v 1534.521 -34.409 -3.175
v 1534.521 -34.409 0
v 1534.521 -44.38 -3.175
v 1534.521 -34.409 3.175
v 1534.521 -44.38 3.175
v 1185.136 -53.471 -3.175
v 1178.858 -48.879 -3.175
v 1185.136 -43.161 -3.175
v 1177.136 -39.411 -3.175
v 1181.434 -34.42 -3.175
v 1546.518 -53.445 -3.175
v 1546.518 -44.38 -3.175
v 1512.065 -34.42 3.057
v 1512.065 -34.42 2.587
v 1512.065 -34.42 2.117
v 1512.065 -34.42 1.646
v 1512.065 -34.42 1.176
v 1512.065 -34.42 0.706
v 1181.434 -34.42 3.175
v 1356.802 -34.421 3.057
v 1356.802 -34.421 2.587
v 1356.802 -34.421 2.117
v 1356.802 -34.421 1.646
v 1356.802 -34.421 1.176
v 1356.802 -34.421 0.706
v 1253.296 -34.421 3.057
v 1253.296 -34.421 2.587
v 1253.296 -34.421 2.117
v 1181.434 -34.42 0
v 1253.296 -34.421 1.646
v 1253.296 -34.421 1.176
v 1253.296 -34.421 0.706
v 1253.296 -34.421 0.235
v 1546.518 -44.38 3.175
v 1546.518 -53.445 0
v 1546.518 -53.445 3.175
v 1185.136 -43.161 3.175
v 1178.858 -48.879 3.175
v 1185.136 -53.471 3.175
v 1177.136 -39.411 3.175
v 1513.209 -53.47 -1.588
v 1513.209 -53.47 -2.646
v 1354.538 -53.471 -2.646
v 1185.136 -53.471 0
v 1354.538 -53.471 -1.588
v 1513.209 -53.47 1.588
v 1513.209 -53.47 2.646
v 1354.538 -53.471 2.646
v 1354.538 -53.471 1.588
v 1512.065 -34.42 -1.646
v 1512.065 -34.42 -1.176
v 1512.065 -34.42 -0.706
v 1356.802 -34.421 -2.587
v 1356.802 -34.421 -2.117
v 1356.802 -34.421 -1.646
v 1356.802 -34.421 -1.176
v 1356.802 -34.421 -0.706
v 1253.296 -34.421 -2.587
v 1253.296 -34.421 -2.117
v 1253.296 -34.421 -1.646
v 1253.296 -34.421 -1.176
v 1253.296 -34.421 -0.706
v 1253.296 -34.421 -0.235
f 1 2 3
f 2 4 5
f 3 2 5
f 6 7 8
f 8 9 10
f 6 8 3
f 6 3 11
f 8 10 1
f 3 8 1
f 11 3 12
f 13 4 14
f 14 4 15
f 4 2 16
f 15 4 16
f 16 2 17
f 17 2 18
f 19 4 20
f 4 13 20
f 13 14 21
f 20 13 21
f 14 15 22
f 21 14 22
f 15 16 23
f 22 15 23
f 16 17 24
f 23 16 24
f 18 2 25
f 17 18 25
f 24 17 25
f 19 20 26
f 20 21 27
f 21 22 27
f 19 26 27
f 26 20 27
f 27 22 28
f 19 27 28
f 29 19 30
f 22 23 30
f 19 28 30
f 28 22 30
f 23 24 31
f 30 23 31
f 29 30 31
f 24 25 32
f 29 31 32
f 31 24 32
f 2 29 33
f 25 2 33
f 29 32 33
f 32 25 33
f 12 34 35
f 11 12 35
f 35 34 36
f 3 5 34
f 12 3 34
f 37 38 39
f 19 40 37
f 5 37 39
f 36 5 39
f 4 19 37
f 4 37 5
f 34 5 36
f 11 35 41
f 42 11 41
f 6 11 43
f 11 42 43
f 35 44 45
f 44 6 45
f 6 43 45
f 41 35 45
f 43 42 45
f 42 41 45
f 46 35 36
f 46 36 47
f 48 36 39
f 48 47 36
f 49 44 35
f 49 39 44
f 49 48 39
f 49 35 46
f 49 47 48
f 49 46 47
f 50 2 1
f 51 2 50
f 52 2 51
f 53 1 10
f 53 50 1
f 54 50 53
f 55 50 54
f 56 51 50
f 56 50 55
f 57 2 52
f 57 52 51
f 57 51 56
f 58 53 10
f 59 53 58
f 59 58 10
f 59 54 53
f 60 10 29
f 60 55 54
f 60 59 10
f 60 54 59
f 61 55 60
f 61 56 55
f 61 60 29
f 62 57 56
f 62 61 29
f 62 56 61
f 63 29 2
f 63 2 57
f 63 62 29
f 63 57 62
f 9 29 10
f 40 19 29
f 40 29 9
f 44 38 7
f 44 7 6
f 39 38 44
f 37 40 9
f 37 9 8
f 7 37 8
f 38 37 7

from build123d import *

# Parameters (mm, degrees)
BOSS_EXTRUDE1_DEPTH = 3.175
CUT_EXTRUDE1_DEPTH  = 7.3500001
FILLET1_R           = 2.54
CUT_EXTRUDE2_DEPTH  = 7.62


with BuildPart() as part:
    # Sketch1 → Boss-Extrude1 (new body, symmetric)
    with BuildSketch(Plane.XY):
        with BuildLine():
            Line((499.61002795, -53.470702797), (1046.28548189, -53.470702797))
            add(Edge.make_bspline(
                [(2669.54, -9.569049356), (2615.393603553, -13.17073937), (2561.080658619, -16.536108081), (2506.205230446, -19.758621957), (2430.209106802, -23.505211705), (2354.212983157, -26.631486423), (2332.570330468, -27.480988169), (2156.268639429, -34.377768543), (1979.966947376, -41.628631248), (1824.114277635, -52.771265877), (1636.928606778, -53.579569849), (1449.742935921, -53.454024613), (1418.006730935, -53.470702797), (1324.899336146, -53.470702797), (1231.791940344, -53.470702797), (1170.441269319, -53.470702797), (1108.784075813, -53.470702797), (1047.126882346, -53.470702797), (1046.846414188, -53.470702797), (1046.565947184, -53.470702797), (1046.28548189, -53.470702797)],
                knots=[103.698913506, 103.698913506, 103.698913506, 103.698913506, 103.698913506, 103.698913506, 130.927896619, 130.927896619, 130.927896619, 141.337054719, 141.337054719, 141.337054719, 218.101815019, 218.101815019, 218.101815019, 233.772059419, 233.772059419, 233.772059419, 264.077723219, 264.077723219, 264.077723219, 264.2162088, 264.2162088, 264.2162088, 264.2162088, 264.2162088, 264.2162088], degree=5))
            Line((2669.54, -9.569049356), (2669.54, 9.5231025))
            add(Edge.make_bspline(
                [(2669.54, 9.5231025), (2667.126494524, 9.36235515), (2659.861586685, 8.880281494), (2635.666282302, 7.292469146), (2596.857665529, 4.826056853), (2545.729743039, 1.758344093), (2494.405305707, -1.098555235), (2451.533022267, -3.266573297), (2417.198316756, -4.86708361), (2391.457076919, -6.003589235), (2365.634736307, -7.086854581), (2339.546284672, -8.137729944), (2313.466132974, -9.165138371), (2287.612375486, -10.179478215), (2261.763347437, -11.201032297), (2227.285329715, -12.583842557), (2184.175569393, -14.36607236), (2132.429066114, -16.607427868), (2063.4255234, -19.708920485), (1977.174907635, -23.700543313), (1873.732451432, -28.149389221), (1770.37461881, -31.657468649), (1667.085687813, -33.793117556), (1581.011094491, -34.383188831), (1512.07397126, -34.4278026), (1443.061513477, -34.409510402), (1356.800927879, -34.424432812), (1218.794626954, -34.418464788), (1115.289022786, -34.420702797), (1046.28548189, -34.420702797)],
                knots=[103.571582669, 103.571582669, 103.571582669, 103.571582669, 104.300777207, 105.766098403, 110.877392287, 115.98868617, 121.099980054, 126.211273938, 128.76692088, 131.322567822, 133.878214764, 136.433861706, 138.989508647, 141.545155589, 144.100802531, 146.656449473, 151.767743357, 156.879037241, 161.990331124, 172.212918892, 182.43550666, 192.658094427, 202.880682195, 213.103269962, 218.214563846, 223.32585773, 233.548445497, 243.771033265, 264.2162088, 264.2162088, 264.2162088, 264.2162088], degree=3))
            Line((1046.28548189, -34.420702797), (499.61002795, -34.420702797))
            add(Edge.make_bspline(
                [(499.61002795, -34.420702797), (488.614737518, -34.420702797), (472.236395365, -34.420702798), (449.940231846, -34.420702794), (427.771305695, -34.42070281), (405.874681663, -34.420702712), (384.584909128, -34.420702942), (368.900229326, -34.420702244), (353.376568613, -34.420704862), (332.608466435, -34.420689186), (306.287754853, -34.420570006), (274.023487704, -34.420538256), (252.271015965, -34.420709741), (241.425150134, -34.420702761)],
                knots=[19.90682951, 19.90682951, 19.90682951, 19.90682951, 23.220120017, 24.876765271, 26.533410525, 29.846701033, 31.503346286, 33.15999154, 34.816636794, 36.473282048, 39.786572556, 43.099863063, 46.413153571, 46.413153571, 46.413153571, 46.413153571], degree=3))
            add(Edge.make_bspline(
                [(241.425150134, -34.420702761), (239.394928853, -34.420701455), (235.322322927, -34.420495867), (227.274423443, -34.398702533), (217.319360062, -34.297466855), (205.530690077, -33.976385563), (189.963341914, -33.212641271), (170.696984653, -31.543495194), (147.533261232, -28.314398128), (125.482753206, -24.202109872), (109.358914834, -20.622537553), (100.964116069, -18.612521054), (99.06, -18.149327722)],
                knots=[0, 0, 0, 0, 0.622088422, 1.244176844, 2.488353689, 3.732530533, 4.976707377, 7.465061066, 9.953414755, 12.441768444, 14.55823542, 15.180323842, 15.180323842, 15.180323842, 15.180323842], degree=3))
            Line((99.06, -18.149327722), (99.06, -37.741485304))
            add(Edge.make_bspline(
                [(241.425137875, -53.470702761), (224.286916993, -53.470691732), (207.149474967, -53.467315374), (190.203897513, -52.686577078), (161.734965878, -49.987457476), (133.266034188, -45.175583375), (121.749620566, -42.910592695), (110.349390726, -40.420274627), (99.06, -37.741485304)],
                knots=[0, 0, 0, 0, 0, 0, 8.71381608, 8.71381608, 8.71381608, 14.701907176, 14.701907176, 14.701907176, 14.701907176, 14.701907176, 14.701907176], degree=5))
            add(Edge.make_bspline(
                [(499.61002795, -53.470702797), (492.136820835, -53.470702797), (484.754348064, -53.470702797), (477.443025859, -53.470702797), (448.516583145, -53.470702797), (419.590140517, -53.470702797), (398.368118521, -53.470702797), (355.647540186, -53.470702797), (312.926961851, -53.470702797), (289.235090436, -53.470293029), (265.364963651, -53.470705034), (241.4948369, -53.470702789), (241.471603891, -53.470702785), (241.448370882, -53.470702776), (241.425137875, -53.470702761)],
                knots=[19.90682951, 19.90682951, 19.90682951, 19.90682951, 19.90682951, 19.90682951, 23.637897311, 23.637897311, 23.637897311, 34.276545571, 34.276545571, 34.276545571, 46.401340901, 46.401340901, 46.401340901, 46.413153571, 46.413153571, 46.413153571, 46.413153571, 46.413153571, 46.413153571], degree=5))
        make_face()
    extrude(amount=BOSS_EXTRUDE1_DEPTH, both=True)

    # Sketch2 → Cut-Extrude1 (cut, through all)
    with BuildSketch(Plane.XY.offset(3.175)):
        with BuildLine():
            add(Edge.make_bspline(
                [(2312.9875, -9.183260037), (2304.505441691, -9.516700376), (2287.441020622, -10.186250162), (2261.763347437, -11.201032297), (2228.230552004, -12.545932515), (2203.310445107, -13.575047161), (2187.00995947, -14.263260037)],
                knots=[139.04033329, 139.04033329, 139.04033329, 139.04033329, 141.545155589, 144.100802531, 146.656449473, 151.487488909, 151.487488909, 151.487488909, 151.487488909], degree=3))
            Line((2187.00995947, -14.263260037), (2312.9875, -14.263260037))
            Line((2312.9875, -14.263260037), (2312.9875, -9.183260037))
        make_face()
    extrude(amount=-CUT_EXTRUDE1_DEPTH, mode=Mode.SUBTRACT)

    # Fillet1
    fillet1_edges = [part.edges().sort_by_distance(p)[0] for p in [
        (2669.54, -9.569049356, -1.5875),
        (2669.54, 9.5231025, -1.5875),
        (99.06, -37.741485304, -1.5875),
        (99.06, -18.149327722, -1.5875),
        (2312.9875, -9.183260037, 1.5875),
        (2312.9875, -14.263260037, 0),
    ]]
    fillet(fillet1_edges, radius=FILLET1_R)

    # Sketch3 → Cut-Extrude2 (cut)
    with BuildSketch(Plane.XY.offset(3.175)):
        Polygon((1181.433983433, -34.420040525), (1177.136382458, -39.41105826), (1185.135968065, -43.161373269), (1178.857838528, -48.879066642), (1185.135968065, -53.470702797), (1185.135968065, -76.771212746), (0, -269.970579329), (-115.576123812, 193.994123709), (1181.433983433, 141.355355937), align=None)
        Polygon((1534.520918045, -34.408934174), (1534.520918045, -44.380222694), (1546.518002564, -44.380222694), (1546.518002564, -53.444776375), (1547.50690107, -59.06466964), (2722.698551589, -126.981023112), (2732.810767707, 122.182227989), (1534.520918045, 141.355355937), align=None)
    extrude(amount=-CUT_EXTRUDE2_DEPTH, mode=Mode.SUBTRACT)


solid = part.part
